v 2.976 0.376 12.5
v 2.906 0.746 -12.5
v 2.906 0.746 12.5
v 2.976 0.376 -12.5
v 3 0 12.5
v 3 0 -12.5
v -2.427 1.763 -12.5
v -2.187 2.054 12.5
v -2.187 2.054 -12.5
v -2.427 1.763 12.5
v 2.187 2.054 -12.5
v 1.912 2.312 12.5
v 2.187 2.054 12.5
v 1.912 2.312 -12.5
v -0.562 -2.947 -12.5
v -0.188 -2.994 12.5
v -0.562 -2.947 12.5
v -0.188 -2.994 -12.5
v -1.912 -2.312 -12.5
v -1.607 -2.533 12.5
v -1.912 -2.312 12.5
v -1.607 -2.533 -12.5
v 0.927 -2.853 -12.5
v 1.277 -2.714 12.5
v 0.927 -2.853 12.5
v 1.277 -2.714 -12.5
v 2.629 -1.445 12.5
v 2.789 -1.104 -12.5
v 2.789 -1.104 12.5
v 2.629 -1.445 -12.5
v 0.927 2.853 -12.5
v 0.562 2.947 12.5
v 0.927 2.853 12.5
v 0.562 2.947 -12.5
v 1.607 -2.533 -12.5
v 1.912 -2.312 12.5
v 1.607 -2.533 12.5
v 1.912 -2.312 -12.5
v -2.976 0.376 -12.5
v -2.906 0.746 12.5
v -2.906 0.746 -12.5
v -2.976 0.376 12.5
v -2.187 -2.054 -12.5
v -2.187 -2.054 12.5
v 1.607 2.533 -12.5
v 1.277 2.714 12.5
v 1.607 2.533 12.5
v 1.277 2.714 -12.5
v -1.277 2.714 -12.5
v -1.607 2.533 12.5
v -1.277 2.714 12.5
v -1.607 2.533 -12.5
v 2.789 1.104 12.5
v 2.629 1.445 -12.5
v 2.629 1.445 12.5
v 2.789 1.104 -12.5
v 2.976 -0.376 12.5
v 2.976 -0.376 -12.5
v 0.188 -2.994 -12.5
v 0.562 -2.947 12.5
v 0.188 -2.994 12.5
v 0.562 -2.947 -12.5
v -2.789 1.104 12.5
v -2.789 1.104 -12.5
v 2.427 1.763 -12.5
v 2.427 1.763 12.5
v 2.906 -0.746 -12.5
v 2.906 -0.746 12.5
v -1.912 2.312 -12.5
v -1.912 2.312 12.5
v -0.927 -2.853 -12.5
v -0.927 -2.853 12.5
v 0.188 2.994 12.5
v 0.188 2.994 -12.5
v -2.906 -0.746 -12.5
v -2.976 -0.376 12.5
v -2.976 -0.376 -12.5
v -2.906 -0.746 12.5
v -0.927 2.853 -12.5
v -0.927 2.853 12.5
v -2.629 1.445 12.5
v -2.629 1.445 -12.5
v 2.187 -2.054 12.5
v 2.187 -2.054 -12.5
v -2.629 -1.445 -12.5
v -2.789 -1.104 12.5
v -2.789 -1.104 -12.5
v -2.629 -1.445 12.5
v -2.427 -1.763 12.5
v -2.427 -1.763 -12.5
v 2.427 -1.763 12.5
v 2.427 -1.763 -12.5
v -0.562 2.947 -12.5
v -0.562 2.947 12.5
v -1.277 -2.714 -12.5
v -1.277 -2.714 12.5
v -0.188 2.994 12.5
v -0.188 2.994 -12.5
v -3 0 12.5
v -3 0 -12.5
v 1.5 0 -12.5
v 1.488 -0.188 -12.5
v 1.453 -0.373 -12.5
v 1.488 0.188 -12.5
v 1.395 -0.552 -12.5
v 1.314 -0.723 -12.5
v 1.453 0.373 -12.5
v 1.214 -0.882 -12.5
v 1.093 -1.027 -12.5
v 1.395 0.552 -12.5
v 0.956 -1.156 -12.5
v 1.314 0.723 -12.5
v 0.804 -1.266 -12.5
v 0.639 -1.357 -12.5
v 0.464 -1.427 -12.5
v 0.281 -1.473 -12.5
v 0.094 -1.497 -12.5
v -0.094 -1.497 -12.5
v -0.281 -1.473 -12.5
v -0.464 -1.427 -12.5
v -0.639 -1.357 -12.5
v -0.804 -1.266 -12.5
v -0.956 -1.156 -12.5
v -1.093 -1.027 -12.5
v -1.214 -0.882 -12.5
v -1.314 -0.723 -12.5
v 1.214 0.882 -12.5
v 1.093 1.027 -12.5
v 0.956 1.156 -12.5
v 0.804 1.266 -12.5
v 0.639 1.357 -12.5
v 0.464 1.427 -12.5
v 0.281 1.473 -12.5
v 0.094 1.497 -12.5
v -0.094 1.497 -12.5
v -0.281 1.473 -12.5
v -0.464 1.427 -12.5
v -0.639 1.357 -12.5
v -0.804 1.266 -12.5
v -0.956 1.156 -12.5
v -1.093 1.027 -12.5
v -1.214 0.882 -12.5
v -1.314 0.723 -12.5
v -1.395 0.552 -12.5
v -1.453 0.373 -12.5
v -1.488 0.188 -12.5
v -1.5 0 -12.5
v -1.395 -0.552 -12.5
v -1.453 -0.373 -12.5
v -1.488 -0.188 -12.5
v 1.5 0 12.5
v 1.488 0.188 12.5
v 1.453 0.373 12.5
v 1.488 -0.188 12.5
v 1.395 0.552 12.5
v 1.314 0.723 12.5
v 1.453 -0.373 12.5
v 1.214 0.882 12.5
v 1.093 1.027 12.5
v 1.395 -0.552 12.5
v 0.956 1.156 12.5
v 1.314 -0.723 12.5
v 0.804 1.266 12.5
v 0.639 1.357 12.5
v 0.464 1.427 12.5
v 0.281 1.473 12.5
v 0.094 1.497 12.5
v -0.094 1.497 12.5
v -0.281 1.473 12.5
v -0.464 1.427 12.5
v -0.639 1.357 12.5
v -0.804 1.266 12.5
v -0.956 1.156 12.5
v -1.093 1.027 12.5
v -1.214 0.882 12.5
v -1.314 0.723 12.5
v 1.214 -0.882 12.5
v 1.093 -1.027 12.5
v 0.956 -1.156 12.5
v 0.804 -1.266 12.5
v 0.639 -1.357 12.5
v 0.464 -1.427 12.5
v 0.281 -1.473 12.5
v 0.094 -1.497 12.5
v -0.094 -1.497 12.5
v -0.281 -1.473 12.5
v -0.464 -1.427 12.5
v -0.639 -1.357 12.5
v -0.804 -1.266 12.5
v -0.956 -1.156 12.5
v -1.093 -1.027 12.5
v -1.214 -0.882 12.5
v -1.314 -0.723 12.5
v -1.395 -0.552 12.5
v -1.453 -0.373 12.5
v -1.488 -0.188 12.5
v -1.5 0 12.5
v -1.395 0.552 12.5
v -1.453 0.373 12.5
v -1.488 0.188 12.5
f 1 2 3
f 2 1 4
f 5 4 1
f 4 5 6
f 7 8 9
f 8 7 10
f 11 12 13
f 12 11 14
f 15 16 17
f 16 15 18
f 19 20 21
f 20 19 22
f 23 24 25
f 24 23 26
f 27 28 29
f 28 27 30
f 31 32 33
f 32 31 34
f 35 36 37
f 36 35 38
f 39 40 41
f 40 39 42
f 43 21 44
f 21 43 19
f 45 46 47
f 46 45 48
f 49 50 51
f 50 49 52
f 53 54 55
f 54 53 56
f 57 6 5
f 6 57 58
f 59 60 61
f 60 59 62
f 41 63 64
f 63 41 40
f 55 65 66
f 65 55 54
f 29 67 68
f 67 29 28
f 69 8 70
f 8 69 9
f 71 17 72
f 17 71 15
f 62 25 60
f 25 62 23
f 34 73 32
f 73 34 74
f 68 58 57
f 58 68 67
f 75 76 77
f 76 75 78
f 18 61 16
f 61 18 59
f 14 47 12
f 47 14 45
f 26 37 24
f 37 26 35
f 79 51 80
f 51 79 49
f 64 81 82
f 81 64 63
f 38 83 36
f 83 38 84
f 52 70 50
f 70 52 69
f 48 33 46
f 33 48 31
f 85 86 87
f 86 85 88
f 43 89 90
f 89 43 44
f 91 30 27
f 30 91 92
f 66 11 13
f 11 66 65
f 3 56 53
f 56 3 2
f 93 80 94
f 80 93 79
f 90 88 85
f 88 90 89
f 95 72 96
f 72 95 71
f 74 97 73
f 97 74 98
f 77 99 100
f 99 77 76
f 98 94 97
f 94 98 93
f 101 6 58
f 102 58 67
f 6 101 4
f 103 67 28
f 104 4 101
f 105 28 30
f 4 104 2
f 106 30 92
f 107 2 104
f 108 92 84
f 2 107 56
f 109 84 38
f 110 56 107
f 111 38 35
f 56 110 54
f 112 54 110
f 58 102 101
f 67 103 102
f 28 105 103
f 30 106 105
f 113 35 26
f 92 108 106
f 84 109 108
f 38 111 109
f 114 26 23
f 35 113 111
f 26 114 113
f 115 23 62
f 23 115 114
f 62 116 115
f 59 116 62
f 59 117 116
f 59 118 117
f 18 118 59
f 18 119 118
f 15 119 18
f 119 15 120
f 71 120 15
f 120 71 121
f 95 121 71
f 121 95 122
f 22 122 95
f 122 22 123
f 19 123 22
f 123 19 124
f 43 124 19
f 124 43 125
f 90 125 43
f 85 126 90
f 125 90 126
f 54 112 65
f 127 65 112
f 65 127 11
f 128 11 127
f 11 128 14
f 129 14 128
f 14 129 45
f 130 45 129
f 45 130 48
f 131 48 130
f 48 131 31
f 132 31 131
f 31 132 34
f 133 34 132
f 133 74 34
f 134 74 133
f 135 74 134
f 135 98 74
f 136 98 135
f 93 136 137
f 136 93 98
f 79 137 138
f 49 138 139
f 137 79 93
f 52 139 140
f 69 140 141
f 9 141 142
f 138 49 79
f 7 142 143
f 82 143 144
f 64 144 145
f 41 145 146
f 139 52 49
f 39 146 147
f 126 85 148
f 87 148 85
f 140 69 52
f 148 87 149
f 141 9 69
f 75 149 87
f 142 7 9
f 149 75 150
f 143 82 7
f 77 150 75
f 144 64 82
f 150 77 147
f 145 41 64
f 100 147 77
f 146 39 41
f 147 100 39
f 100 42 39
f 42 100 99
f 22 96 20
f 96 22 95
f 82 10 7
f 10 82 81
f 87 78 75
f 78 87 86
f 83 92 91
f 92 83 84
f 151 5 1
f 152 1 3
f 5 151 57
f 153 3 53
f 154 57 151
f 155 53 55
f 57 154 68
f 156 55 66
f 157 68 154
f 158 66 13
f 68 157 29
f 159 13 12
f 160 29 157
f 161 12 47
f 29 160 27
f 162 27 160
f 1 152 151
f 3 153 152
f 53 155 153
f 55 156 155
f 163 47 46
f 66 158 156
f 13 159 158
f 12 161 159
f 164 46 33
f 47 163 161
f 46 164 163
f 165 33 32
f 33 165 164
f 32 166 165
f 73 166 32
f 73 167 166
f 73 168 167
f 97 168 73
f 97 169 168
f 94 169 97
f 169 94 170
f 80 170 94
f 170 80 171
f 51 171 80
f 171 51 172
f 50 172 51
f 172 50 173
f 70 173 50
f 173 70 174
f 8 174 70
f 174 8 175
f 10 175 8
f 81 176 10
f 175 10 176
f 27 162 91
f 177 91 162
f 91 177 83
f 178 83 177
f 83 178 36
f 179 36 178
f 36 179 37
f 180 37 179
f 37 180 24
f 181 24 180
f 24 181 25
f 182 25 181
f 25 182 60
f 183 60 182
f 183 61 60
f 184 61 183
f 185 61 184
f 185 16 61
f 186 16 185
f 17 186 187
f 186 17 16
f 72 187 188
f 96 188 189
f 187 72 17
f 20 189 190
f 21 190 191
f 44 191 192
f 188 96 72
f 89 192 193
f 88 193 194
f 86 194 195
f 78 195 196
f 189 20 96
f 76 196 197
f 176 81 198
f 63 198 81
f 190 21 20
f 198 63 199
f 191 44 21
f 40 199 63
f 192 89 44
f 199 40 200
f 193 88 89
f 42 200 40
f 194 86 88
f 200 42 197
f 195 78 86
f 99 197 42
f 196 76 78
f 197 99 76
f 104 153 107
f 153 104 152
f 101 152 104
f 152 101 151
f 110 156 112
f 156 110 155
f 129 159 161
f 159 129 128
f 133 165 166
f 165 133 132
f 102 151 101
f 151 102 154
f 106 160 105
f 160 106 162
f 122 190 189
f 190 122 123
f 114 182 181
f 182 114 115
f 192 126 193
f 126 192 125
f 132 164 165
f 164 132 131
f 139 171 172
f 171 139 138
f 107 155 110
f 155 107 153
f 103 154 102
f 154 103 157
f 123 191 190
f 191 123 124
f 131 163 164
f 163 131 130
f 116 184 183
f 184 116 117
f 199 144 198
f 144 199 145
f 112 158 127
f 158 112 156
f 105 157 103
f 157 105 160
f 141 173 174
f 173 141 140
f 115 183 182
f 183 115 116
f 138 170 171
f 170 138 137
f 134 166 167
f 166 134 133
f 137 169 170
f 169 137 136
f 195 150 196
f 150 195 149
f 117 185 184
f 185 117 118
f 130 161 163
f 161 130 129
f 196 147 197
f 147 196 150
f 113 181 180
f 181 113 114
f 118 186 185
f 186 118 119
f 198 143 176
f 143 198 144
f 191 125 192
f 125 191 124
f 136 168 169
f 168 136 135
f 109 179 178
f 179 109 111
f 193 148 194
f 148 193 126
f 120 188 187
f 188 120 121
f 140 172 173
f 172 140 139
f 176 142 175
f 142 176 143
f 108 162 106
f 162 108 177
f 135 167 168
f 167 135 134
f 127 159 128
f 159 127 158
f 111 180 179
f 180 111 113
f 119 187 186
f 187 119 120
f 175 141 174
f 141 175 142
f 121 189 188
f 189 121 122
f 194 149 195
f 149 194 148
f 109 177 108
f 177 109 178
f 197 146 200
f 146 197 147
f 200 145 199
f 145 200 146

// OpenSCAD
$fn = 50;


difference() {
	union() {
		translate(v = [0, 0, -12.5000000000]) {
			cylinder(h = 25, r = 3.0000000000);
		}
	}
	union() {
		translate(v = [0, 0, -100.0000000000]) {
			cylinder(h = 200, r = 1.5000000000);
		}
	}
}
